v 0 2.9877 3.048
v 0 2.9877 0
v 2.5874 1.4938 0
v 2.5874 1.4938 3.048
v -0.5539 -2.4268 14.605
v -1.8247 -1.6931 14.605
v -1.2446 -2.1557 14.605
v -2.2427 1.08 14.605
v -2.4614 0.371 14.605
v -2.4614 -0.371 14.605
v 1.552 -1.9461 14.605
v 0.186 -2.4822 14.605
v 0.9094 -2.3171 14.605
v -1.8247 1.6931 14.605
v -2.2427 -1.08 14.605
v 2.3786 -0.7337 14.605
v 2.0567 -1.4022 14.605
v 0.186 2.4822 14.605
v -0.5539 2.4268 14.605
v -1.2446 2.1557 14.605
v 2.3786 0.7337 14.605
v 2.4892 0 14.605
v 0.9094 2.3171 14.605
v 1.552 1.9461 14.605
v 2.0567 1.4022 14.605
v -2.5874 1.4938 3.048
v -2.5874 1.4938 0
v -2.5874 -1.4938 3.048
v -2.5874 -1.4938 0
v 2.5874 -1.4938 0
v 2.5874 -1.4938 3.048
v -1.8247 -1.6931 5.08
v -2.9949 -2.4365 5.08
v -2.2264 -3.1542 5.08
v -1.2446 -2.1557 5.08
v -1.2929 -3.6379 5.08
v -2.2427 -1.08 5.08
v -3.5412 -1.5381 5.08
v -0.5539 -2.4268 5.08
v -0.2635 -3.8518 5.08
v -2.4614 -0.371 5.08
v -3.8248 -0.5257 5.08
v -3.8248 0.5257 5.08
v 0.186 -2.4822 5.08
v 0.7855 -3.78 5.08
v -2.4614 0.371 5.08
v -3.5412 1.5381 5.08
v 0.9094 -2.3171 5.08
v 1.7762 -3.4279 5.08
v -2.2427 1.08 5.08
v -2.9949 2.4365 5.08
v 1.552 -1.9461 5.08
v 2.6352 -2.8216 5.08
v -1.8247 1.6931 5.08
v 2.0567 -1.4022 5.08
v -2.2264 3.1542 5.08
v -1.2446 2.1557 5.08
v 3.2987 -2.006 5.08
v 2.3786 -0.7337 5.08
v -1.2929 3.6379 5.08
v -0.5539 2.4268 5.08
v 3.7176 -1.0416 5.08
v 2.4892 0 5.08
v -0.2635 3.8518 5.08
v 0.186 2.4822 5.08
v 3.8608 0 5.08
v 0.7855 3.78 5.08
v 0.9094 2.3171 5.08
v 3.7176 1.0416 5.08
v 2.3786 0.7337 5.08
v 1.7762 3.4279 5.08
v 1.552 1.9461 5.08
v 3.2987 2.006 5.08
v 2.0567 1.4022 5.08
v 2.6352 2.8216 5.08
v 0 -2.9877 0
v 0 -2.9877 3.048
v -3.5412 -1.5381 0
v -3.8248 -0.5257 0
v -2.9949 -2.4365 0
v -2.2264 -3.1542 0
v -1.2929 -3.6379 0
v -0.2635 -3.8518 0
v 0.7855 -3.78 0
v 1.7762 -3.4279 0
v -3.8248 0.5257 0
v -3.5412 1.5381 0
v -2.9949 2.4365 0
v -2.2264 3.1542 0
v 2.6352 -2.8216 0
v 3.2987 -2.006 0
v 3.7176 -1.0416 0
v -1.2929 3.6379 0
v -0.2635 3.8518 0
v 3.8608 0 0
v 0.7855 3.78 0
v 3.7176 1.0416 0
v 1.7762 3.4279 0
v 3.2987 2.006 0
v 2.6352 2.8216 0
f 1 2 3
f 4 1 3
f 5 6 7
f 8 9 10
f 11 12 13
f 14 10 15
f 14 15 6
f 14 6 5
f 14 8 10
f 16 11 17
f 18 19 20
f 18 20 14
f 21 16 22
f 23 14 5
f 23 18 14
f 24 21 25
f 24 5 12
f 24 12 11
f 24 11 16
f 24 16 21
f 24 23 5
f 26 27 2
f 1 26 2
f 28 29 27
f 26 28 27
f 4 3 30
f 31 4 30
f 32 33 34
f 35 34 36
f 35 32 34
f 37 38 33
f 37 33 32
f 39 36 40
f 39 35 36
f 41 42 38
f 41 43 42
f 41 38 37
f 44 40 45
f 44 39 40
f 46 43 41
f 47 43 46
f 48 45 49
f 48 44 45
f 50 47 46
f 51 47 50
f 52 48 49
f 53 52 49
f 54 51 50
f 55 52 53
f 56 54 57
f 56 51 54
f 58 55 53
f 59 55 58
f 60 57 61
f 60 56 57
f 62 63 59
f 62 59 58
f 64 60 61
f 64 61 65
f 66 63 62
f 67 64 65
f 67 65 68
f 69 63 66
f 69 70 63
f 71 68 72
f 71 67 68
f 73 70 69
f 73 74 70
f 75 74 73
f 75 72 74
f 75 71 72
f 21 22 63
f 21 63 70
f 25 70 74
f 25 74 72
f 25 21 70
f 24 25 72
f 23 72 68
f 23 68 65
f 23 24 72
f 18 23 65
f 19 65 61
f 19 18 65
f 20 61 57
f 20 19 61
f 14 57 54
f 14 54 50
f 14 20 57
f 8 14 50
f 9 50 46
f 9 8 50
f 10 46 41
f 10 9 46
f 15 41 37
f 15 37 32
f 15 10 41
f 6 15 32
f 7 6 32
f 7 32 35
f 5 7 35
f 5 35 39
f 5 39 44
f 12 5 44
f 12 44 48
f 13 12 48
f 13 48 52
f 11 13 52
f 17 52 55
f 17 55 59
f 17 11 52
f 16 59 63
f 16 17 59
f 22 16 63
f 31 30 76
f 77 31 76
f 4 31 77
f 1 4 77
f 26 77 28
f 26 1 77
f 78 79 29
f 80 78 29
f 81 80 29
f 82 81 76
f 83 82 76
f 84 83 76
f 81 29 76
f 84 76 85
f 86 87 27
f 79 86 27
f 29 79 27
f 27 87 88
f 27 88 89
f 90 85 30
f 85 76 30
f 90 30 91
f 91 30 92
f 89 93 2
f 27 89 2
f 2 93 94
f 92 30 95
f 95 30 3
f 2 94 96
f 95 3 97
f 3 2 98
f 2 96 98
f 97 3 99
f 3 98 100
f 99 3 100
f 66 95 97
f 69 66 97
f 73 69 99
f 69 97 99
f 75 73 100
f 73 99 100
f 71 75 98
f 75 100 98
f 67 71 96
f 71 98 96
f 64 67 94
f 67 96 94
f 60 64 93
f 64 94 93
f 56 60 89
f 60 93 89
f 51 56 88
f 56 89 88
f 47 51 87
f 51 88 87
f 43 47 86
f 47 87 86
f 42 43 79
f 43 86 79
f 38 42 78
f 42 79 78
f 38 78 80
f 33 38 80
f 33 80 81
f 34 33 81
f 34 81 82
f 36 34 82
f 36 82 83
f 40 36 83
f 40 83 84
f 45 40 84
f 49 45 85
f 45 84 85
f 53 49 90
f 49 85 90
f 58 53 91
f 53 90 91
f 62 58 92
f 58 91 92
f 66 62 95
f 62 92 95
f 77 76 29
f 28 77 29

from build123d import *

# Parameters (mm, degrees)
SKETCH1_R         = 3.8608
EXTRUDE1_DEPTH    = 14.605
SKETCH2_OUTSIDE_W = 13.37
SKETCH2_OUTSIDE_H = 13.37
SKETCH2_OUTSIDE_R = 2.4892
EXTRUDE2_DEPTH    = 9.525
EXTRUDE3_DEPTH    = 3.048


with BuildPart() as part:
    # Sketch1 → Extrude1 (new body)
    with BuildSketch(Plane.XY):
        Circle(SKETCH1_R)
    extrude(amount=EXTRUDE1_DEPTH)

    # Sketch2 outside → Extrude2 (cut)
    with BuildSketch(Plane.XY.offset(14.605)):
        Rectangle(SKETCH2_OUTSIDE_W, SKETCH2_OUTSIDE_H)
        Circle(SKETCH2_OUTSIDE_R, mode=Mode.SUBTRACT)
    extrude(amount=-EXTRUDE2_DEPTH, mode=Mode.SUBTRACT)

    # Sketch3 → Extrude3 (cut)
    with BuildSketch(Plane(origin=(0, 0, 0), x_dir=(-1, 0, 0), z_dir=(0, 0, -1))):
        Polygon((0, 2.987683948), (-2.587410198, 1.493841974), (-2.587410198, -1.493841974), (0, -2.987683948), (2.587410198, -1.493841974), (2.587410198, 1.493841974), align=None)
    extrude(amount=-EXTRUDE3_DEPTH, mode=Mode.SUBTRACT)


solid = part.part
